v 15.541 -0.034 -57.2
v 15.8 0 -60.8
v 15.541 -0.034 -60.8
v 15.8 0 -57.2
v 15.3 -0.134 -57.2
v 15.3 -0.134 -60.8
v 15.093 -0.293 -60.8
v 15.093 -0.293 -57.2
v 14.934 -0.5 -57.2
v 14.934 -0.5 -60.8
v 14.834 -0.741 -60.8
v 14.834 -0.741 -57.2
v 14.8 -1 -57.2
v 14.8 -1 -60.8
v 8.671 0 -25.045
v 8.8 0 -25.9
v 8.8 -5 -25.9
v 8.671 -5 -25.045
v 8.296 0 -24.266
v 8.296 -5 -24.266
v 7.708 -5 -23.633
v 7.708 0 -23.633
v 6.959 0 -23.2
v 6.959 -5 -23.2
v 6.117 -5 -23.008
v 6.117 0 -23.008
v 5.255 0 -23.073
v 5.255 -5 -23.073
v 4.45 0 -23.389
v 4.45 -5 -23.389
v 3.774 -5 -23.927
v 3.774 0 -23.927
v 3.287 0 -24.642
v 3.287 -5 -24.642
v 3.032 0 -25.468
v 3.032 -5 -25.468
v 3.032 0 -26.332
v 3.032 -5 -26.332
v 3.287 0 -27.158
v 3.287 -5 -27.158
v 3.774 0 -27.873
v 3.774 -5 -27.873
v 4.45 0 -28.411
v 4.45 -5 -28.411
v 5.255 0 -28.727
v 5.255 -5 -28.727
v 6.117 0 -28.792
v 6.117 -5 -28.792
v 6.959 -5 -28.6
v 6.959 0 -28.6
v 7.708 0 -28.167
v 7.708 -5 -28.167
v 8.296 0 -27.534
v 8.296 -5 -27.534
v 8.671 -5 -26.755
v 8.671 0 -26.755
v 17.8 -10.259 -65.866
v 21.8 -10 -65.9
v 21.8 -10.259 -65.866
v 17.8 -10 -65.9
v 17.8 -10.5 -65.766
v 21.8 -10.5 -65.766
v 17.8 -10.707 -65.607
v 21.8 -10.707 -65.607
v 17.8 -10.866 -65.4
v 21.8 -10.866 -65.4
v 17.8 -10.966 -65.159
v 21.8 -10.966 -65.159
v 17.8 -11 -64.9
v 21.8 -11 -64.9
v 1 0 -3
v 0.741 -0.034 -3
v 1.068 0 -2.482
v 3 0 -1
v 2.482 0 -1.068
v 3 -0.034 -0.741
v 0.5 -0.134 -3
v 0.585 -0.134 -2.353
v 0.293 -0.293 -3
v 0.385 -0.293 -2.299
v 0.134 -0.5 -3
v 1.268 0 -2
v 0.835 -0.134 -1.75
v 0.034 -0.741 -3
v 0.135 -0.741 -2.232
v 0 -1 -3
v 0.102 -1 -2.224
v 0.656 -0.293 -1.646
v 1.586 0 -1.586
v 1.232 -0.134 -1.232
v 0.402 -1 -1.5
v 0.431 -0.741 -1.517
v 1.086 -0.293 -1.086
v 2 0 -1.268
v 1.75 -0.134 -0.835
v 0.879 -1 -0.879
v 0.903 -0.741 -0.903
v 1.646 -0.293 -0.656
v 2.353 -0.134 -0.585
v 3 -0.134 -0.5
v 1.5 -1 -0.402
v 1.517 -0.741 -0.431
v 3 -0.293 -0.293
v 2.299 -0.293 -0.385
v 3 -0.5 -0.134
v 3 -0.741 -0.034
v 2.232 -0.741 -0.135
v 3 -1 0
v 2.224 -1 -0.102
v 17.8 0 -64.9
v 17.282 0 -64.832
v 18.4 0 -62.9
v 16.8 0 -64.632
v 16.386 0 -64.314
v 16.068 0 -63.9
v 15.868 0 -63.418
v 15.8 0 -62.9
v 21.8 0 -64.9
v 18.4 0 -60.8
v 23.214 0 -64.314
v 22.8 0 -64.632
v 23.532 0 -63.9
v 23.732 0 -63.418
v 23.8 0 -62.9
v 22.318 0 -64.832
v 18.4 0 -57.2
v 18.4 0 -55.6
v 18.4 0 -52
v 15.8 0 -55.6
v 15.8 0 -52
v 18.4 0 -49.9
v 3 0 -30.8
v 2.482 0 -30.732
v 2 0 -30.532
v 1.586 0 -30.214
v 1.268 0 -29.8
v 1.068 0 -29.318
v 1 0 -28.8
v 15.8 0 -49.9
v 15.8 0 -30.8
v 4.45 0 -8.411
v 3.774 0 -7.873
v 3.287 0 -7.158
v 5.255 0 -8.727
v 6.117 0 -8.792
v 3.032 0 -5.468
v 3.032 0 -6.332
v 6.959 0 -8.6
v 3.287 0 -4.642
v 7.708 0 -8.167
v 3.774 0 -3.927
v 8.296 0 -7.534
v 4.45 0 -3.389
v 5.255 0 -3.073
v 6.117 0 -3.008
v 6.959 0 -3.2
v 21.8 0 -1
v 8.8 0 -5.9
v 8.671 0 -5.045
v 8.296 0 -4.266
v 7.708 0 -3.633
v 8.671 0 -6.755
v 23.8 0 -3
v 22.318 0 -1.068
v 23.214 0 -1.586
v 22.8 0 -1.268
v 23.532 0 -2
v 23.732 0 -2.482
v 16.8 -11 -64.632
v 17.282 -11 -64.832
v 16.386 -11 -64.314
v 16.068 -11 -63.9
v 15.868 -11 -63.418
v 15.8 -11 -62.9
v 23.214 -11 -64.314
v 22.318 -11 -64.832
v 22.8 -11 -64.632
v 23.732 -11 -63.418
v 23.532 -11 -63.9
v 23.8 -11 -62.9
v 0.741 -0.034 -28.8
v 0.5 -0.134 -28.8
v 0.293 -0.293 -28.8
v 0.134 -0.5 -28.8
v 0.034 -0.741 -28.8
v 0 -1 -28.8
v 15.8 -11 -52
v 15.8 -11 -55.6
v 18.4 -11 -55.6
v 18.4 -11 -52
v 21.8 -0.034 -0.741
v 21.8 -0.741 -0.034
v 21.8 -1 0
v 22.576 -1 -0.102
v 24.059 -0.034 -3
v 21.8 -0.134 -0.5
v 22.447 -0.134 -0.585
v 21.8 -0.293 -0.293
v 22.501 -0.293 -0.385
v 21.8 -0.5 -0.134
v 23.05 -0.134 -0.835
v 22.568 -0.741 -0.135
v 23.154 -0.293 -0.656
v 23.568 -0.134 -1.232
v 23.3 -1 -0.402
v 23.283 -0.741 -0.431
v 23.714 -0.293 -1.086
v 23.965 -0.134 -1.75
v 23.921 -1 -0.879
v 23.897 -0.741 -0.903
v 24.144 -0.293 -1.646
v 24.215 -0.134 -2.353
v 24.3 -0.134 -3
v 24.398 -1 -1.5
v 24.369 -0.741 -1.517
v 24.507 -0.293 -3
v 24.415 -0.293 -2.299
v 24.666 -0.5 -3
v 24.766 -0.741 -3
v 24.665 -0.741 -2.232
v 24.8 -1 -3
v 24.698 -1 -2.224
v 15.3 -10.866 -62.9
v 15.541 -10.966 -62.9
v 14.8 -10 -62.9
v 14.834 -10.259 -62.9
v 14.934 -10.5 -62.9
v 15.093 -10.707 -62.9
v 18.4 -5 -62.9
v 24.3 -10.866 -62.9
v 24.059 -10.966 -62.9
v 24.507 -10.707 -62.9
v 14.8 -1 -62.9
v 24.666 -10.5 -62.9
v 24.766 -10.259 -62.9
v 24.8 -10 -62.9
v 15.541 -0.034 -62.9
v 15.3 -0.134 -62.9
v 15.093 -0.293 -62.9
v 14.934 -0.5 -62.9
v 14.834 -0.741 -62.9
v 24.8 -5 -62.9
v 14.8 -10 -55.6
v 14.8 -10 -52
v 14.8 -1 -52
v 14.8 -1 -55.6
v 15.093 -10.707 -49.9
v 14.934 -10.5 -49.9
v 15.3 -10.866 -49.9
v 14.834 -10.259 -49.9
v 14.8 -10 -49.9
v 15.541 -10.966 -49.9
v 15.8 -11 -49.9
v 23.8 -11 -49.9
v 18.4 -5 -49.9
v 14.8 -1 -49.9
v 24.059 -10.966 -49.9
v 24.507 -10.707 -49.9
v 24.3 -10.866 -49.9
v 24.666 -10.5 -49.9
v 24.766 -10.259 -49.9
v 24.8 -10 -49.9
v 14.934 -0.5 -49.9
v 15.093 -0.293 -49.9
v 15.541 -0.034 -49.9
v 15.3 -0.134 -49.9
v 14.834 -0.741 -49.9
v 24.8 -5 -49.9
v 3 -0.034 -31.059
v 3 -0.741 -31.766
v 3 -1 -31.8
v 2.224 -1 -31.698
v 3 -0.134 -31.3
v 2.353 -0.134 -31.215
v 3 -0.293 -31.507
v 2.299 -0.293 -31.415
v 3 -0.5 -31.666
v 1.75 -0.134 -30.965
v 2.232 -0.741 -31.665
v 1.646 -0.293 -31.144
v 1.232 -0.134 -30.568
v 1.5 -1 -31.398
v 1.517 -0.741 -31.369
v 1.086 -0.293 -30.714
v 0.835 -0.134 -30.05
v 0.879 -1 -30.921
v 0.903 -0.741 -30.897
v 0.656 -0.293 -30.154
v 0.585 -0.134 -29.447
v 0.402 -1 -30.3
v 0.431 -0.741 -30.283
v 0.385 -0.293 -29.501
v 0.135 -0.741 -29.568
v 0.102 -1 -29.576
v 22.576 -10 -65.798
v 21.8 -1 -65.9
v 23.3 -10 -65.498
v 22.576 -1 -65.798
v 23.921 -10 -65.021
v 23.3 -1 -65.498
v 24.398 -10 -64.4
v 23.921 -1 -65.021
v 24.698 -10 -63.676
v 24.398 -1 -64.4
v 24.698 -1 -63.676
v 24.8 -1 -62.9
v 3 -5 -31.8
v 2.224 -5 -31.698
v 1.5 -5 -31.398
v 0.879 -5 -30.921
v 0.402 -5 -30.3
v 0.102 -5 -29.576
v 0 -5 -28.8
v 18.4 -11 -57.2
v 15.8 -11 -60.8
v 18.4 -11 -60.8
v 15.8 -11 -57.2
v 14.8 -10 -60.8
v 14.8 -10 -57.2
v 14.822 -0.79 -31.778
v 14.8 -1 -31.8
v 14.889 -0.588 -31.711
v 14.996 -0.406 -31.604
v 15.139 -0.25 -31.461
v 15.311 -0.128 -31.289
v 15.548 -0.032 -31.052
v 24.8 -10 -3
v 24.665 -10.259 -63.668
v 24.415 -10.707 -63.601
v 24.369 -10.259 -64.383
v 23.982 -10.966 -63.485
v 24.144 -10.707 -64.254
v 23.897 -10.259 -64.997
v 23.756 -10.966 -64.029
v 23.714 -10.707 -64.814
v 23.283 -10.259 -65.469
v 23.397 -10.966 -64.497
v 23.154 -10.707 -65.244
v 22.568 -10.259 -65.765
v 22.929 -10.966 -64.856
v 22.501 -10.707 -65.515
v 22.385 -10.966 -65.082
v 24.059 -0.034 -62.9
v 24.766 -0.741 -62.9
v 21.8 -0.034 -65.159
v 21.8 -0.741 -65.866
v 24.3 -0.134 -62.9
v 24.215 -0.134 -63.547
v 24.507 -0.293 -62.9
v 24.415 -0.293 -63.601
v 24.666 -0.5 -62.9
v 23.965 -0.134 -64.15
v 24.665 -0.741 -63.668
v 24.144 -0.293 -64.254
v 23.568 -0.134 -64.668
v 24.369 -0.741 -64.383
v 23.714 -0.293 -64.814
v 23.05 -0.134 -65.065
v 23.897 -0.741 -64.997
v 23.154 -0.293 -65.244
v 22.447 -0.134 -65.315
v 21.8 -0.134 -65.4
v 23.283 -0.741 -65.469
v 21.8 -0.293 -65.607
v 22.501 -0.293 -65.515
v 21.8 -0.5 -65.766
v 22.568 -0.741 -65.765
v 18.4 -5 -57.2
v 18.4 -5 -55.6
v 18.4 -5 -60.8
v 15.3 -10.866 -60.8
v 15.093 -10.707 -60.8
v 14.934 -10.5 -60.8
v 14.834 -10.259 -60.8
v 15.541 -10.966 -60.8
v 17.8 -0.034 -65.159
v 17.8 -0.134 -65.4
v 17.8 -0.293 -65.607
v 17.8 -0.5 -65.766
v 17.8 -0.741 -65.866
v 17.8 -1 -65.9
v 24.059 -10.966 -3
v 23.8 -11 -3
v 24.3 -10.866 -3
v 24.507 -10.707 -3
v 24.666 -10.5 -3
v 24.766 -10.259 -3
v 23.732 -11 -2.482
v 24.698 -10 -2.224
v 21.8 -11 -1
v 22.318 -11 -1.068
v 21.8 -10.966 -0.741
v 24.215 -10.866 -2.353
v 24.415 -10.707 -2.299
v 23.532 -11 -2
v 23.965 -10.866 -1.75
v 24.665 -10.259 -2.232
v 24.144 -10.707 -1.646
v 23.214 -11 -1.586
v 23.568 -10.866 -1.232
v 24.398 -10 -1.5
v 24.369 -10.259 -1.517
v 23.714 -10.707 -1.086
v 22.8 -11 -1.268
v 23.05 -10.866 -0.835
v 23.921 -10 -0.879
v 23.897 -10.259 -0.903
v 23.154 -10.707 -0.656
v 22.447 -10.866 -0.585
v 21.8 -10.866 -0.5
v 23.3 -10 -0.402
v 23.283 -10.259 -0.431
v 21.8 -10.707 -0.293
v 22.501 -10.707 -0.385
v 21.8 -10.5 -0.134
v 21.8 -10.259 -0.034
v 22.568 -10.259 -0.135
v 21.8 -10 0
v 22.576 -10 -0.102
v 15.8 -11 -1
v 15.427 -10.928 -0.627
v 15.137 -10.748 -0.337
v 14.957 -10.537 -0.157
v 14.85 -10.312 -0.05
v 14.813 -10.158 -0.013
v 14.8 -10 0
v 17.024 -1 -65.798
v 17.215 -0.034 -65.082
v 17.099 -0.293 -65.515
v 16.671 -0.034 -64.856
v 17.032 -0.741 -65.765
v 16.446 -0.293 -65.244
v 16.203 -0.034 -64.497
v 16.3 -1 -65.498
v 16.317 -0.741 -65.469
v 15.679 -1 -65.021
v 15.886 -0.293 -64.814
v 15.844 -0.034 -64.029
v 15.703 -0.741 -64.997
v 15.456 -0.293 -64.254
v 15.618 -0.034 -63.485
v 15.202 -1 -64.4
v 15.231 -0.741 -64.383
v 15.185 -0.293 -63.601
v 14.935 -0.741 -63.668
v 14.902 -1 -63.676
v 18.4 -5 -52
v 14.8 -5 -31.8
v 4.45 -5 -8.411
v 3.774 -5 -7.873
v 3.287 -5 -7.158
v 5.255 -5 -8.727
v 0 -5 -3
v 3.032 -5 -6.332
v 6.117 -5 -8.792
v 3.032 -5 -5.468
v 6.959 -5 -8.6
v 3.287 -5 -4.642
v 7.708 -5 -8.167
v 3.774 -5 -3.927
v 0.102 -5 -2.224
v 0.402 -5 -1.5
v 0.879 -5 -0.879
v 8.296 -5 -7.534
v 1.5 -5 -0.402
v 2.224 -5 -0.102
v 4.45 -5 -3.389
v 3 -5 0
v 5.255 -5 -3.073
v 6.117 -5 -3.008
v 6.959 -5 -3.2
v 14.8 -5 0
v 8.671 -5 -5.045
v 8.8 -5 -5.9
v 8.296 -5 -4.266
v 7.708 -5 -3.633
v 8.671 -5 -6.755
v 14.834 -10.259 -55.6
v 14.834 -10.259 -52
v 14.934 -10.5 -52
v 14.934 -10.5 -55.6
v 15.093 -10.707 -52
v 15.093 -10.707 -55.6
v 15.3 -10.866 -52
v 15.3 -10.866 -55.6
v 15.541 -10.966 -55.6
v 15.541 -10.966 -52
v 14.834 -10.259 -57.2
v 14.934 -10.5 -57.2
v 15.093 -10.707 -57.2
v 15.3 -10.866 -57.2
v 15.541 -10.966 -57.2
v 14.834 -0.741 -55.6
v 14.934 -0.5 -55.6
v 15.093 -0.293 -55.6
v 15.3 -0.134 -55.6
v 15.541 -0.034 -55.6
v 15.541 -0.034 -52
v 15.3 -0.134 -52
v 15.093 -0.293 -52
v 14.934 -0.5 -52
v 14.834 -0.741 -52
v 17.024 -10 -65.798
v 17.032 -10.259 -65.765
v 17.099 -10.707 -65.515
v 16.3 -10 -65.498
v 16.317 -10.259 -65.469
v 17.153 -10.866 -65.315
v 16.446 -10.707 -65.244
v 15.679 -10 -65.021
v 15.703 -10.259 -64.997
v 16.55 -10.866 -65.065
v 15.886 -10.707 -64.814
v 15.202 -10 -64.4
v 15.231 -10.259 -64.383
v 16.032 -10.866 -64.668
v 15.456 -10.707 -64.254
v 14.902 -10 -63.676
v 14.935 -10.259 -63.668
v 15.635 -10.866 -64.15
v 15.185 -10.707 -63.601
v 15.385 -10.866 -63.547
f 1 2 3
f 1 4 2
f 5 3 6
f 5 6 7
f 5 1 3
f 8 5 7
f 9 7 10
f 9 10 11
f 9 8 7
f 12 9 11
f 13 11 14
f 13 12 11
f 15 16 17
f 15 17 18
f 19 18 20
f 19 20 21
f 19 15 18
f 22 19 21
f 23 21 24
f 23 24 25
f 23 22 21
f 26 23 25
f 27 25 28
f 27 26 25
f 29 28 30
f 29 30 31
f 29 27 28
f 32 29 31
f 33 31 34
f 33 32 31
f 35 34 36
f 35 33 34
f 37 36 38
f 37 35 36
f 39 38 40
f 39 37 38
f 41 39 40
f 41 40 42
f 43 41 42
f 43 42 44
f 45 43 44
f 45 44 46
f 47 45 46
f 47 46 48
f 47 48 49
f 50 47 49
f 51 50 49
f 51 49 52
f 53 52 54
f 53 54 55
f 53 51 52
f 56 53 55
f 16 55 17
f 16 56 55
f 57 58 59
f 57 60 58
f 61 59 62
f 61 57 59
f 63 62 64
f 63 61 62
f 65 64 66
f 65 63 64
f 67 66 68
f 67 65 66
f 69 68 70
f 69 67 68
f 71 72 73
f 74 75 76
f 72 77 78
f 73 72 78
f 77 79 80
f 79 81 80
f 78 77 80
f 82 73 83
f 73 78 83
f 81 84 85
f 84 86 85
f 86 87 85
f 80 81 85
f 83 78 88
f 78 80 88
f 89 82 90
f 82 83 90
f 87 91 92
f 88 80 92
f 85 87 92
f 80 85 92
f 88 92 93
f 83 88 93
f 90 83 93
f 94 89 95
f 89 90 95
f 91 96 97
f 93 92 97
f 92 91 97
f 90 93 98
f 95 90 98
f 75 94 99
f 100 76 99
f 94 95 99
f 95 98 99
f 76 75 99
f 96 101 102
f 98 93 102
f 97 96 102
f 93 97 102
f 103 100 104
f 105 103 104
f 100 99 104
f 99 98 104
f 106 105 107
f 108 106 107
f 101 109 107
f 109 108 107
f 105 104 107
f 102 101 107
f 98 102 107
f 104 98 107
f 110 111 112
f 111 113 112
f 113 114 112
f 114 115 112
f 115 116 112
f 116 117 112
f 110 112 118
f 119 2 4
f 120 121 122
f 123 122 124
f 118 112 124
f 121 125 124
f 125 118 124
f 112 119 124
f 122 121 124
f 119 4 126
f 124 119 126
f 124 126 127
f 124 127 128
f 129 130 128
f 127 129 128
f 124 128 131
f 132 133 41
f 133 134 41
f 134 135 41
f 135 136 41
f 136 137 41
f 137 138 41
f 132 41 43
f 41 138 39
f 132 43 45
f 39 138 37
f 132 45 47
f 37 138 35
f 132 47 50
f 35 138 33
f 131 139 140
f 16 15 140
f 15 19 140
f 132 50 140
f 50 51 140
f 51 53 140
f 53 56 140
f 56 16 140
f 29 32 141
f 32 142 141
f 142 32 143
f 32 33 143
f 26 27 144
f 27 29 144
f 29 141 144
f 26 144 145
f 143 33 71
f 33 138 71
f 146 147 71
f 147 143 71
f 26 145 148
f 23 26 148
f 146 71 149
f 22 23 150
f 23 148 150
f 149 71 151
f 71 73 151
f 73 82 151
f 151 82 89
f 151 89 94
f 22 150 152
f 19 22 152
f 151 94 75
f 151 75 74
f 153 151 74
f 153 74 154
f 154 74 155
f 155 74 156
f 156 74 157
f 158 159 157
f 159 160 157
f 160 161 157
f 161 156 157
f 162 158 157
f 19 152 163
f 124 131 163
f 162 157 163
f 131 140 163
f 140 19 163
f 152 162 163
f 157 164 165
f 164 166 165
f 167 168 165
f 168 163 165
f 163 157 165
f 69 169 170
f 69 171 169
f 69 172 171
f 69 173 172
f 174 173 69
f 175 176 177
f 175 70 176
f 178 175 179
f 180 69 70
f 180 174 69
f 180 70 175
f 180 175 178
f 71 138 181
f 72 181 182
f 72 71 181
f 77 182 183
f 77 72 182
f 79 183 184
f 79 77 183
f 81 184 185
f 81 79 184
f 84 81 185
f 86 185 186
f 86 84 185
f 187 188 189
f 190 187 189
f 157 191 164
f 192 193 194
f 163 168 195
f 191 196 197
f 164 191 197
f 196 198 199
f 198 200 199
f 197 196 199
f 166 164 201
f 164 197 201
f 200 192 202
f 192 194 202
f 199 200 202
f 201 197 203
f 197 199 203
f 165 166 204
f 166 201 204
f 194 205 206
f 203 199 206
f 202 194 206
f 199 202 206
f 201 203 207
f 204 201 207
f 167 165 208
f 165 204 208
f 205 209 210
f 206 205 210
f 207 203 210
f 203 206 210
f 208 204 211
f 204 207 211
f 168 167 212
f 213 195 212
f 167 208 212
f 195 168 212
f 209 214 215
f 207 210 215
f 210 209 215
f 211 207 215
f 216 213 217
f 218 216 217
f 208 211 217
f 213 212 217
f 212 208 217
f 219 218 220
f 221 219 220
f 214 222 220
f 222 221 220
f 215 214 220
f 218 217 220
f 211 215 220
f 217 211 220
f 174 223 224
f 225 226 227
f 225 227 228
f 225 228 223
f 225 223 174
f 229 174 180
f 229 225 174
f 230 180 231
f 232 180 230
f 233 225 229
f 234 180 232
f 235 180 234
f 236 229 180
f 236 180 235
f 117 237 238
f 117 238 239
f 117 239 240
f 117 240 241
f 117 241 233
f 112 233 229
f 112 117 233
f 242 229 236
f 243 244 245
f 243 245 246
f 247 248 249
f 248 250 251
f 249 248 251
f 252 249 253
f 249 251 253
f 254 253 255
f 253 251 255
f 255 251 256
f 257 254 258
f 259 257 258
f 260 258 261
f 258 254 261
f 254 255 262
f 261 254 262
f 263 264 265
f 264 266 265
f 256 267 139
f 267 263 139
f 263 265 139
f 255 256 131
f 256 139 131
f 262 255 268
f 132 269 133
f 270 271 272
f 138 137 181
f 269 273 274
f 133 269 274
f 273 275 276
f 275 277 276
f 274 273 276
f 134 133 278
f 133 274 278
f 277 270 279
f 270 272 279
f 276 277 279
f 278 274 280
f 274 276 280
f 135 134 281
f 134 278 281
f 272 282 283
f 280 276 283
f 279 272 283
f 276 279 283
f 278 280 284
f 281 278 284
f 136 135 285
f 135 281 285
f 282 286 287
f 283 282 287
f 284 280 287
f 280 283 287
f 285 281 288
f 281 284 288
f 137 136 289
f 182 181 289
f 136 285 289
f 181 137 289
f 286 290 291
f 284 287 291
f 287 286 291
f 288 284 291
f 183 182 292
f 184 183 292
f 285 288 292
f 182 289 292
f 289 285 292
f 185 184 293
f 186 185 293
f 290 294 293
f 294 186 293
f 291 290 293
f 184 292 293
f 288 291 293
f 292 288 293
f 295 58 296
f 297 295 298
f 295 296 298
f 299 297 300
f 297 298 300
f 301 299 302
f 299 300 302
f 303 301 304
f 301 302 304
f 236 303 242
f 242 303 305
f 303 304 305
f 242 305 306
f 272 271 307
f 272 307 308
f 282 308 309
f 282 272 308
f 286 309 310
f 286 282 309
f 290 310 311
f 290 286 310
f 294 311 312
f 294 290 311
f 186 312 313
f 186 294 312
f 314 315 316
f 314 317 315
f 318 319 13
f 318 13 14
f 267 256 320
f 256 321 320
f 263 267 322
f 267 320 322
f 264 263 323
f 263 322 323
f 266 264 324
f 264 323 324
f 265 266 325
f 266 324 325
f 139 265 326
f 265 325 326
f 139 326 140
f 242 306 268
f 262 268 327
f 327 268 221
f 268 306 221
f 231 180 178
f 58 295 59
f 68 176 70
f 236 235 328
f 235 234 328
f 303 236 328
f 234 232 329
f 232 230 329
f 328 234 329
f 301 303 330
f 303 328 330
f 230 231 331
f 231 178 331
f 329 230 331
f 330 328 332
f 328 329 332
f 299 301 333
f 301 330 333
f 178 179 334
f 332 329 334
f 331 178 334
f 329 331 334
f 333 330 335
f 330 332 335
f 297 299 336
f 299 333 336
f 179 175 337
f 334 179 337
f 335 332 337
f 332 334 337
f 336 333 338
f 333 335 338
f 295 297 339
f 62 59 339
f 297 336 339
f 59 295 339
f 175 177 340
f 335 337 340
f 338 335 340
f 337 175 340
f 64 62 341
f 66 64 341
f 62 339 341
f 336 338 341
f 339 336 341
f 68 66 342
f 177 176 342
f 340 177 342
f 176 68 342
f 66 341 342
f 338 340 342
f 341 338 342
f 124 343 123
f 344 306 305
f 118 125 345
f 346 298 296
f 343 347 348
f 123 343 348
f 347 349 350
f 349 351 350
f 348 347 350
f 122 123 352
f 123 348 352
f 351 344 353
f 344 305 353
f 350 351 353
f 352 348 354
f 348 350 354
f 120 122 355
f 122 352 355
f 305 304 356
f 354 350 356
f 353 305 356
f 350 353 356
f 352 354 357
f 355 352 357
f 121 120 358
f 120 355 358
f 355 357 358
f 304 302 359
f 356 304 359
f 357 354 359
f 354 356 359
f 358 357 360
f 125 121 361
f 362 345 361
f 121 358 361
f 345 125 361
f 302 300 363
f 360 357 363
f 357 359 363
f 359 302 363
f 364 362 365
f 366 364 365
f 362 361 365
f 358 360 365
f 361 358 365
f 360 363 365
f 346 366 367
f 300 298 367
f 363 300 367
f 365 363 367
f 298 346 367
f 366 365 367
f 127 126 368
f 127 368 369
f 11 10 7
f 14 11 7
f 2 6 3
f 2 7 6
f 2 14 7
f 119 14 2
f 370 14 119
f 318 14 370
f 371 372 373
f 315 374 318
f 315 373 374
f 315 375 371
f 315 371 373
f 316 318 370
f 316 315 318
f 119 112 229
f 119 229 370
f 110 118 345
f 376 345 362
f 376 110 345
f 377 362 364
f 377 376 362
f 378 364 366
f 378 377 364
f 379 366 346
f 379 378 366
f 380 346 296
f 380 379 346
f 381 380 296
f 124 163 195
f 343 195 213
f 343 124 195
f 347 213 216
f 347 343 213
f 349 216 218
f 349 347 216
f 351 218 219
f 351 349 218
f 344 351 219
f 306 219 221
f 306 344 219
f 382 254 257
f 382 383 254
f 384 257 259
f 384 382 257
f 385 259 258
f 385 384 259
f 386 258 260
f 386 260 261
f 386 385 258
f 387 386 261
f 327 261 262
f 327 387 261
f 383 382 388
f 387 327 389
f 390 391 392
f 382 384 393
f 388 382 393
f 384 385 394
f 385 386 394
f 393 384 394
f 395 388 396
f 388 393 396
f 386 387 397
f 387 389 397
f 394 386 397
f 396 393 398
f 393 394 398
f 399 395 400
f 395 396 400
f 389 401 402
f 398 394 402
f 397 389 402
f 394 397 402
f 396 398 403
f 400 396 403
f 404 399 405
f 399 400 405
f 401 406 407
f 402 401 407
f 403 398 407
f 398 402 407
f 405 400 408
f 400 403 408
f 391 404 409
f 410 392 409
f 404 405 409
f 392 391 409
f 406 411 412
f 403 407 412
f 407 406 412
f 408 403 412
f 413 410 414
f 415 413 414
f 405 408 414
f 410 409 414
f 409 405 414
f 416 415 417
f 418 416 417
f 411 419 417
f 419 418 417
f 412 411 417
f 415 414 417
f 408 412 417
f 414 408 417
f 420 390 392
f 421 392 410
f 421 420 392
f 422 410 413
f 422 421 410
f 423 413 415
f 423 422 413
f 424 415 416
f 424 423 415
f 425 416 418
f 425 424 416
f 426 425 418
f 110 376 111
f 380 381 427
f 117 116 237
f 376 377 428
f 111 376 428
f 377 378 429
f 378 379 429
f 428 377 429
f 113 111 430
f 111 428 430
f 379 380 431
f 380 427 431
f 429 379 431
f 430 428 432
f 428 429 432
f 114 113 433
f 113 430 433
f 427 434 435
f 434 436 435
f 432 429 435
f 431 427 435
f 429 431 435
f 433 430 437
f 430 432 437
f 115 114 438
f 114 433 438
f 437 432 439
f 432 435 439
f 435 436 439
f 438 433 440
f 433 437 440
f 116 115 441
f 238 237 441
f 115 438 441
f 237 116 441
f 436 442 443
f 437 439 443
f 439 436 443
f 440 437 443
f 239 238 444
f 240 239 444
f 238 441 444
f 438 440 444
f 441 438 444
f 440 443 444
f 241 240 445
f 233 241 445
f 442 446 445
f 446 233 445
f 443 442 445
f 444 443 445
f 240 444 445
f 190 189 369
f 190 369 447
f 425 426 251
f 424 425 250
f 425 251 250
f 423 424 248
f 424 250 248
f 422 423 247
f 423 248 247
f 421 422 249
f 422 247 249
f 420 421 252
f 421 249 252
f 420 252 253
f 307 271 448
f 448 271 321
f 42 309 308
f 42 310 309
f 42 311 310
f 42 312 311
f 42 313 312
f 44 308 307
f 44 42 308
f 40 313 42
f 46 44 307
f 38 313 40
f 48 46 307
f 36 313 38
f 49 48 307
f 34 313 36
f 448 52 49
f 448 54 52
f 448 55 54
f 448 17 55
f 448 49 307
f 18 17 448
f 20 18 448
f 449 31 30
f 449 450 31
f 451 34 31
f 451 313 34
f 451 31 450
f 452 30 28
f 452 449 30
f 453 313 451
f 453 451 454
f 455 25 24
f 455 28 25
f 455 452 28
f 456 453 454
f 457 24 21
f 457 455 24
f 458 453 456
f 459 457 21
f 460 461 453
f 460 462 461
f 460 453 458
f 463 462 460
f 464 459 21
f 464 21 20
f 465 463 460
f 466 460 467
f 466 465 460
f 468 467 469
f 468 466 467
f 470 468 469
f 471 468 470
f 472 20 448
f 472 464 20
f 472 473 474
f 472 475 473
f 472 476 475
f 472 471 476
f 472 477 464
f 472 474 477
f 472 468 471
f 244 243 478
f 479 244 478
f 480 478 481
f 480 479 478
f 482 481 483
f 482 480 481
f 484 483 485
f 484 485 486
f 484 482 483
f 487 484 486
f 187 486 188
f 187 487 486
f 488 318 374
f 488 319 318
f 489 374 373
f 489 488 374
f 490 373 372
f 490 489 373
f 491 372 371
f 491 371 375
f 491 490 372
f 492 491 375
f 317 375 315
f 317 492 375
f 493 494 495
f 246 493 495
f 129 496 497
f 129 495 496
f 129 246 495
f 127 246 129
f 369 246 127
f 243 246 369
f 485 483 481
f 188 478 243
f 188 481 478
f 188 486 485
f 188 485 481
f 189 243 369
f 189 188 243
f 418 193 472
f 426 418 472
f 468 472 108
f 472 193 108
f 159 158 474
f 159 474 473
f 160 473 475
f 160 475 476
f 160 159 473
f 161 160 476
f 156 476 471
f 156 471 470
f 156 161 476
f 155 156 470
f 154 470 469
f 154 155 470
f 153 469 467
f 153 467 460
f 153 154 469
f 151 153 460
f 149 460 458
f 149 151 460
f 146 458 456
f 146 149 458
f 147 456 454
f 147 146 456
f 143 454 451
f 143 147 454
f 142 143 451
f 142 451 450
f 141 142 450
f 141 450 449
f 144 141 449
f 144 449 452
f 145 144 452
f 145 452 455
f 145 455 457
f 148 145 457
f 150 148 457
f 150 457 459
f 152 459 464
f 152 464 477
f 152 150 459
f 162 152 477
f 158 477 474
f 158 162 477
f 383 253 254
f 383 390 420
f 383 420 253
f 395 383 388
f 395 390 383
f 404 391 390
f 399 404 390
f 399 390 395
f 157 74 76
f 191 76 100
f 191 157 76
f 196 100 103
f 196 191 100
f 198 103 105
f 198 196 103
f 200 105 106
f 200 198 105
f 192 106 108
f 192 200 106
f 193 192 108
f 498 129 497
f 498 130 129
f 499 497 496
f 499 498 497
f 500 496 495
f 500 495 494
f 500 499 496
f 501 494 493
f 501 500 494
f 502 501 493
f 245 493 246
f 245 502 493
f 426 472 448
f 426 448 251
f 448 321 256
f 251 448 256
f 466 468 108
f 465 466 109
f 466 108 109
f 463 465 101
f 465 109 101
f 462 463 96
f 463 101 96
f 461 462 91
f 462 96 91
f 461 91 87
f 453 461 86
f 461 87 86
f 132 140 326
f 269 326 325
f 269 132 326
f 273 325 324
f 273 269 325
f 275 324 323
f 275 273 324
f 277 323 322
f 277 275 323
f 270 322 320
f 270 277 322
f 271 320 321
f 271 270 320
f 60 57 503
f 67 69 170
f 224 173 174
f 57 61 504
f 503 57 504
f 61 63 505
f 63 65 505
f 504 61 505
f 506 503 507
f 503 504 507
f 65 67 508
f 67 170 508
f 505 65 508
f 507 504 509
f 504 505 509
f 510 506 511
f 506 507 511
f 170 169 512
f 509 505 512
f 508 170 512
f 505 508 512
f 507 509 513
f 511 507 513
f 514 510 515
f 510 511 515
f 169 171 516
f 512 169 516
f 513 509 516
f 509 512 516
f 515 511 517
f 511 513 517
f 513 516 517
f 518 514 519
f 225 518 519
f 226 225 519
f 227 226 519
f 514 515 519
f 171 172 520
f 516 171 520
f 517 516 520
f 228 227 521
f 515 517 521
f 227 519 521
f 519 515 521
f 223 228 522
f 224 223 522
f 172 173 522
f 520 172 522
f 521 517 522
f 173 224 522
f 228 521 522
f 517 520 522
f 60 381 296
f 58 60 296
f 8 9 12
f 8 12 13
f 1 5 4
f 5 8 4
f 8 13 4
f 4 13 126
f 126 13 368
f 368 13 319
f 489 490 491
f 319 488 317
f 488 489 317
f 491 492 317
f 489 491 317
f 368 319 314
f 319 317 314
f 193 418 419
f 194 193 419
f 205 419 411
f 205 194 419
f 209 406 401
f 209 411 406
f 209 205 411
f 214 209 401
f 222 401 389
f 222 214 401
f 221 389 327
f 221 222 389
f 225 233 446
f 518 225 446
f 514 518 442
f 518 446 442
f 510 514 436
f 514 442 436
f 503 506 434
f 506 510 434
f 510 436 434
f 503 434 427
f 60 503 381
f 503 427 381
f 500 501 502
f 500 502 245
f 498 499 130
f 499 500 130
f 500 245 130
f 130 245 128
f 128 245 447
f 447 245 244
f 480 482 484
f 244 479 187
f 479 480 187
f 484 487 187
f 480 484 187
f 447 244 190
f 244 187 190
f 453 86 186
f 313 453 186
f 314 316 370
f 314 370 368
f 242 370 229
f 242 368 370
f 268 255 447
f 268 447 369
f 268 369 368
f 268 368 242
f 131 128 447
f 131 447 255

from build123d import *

# Parameters (mm, degrees)
F0_R        = 2.9
F0_W        = 10
F0_H        = 34.1
F1_DEPTH    = 5
F2_W        = 10
F2_H        = 3
F3_DEPTH    = 6
F4_W        = 3.6
F4_H        = 3.6
F5_DEPTH    = 6
F6_W        = 3.6
F6_H        = 2.1
F6_H_2      = 1.6
F7_DEPTH    = 5.001
F8_T1_DEPTH = 20
F8_T3_DEPTH = 26
F9_R        = 1


# Not quite as in the source:
# - a fillet or chamfer that OpenCascade refuses, or shapes differently, is made with other operations: its cross-section is extruded or revolved along the edge and cut away or added


with BuildPart() as f1:
    # F0 (on Front) → F1 (new body)
    with BuildSketch(Plane.XZ):
        Polygon((24.8, 0), (0, 0), (0, -31.8), (14.8, -31.8), (24.8, -31.8), align=None)
        with Locations((5.9, -25.9)):
            Circle(F0_R, mode=Mode.SUBTRACT)
        with Locations((5.9, -5.9)):
            Circle(F0_R, mode=Mode.SUBTRACT)
        with Locations((19.8, -48.85)):
            Rectangle(F0_W, F0_H)
    extrude(amount=F1_DEPTH)

    # F2 (on face) → F3 (join)
    with BuildSketch(Plane.XZ.offset(5)):
        Polygon((14.8, -49.9), (24.8, -49.9), (24.8, 0), (14.8, 0), (14.8, -31.8), align=None)
        with Locations((19.8, -64.4)):
            Rectangle(F2_W, F2_H)
    extrude(amount=F3_DEPTH)

    # F4 (on face) → F5 (join, through all)
    with BuildSketch(Plane.XZ.offset(5)):
        with Locations((16.6, -53.8)):
            Rectangle(F4_W, F4_H)
        with Locations((16.6, -59)):
            Rectangle(F4_W, F4_H)
    extrude(amount=F5_DEPTH)

    # F6 (on face) → F7 (cut, through all)
    with BuildSketch(Plane.XZ.offset(5)):
        with Locations((16.6, -50.95)):
            Rectangle(F6_W, F6_H)
        with Locations((16.6, -56.4)):
            Rectangle(F6_W, F6_H_2)
        with Locations((16.6, -61.85)):
            Rectangle(F6_W, F6_H)
    extrude(amount=-F7_DEPTH, mode=Mode.SUBTRACT)

    # F8: fillet of radius 3 on 5 edges, made by hand

    # F8_s2 → F8_t1 (cut)
    with BuildSketch(Plane.XZ.offset(-7.5)):
        with BuildLine():
            ThreePointArc((3, -31.8), (0.8786796564, -30.9213203436), (0, -28.8))
            Line((0, -28.8), (0, -31.8))
            Line((0, -31.8), (3, -31.8))
        make_face()
        with BuildLine():
            ThreePointArc((3, 0), (0.8786796564, -0.8786796564), (0, -3))
            Line((0, -3), (0, 0))
            Line((0, 0), (3, 0))
        make_face()
    extrude(amount=F8_T1_DEPTH, mode=Mode.SUBTRACT)

    # F8_s4 → F8_t3 (cut)
    with BuildSketch(Plane.XZ.offset(-7.5)):
        with BuildLine():
            ThreePointArc((21.8, 0), (23.9213203436, -0.8786796564), (24.8, -3))
            Line((24.8, -3), (24.8, 0))
            Line((24.8, 0), (21.8, 0))
        make_face()
        with BuildLine():
            ThreePointArc((21.8, -65.9), (23.9213203436, -65.0213203436), (24.8, -62.9))
            Line((24.8, -62.9), (24.8, -65.9))
            Line((24.8, -65.9), (21.8, -65.9))
        make_face()
        with BuildLine():
            ThreePointArc((14.8, -62.9), (15.6786796564, -65.0213203436), (17.8, -65.9))
            Line((17.8, -65.9), (14.8, -65.9))
            Line((14.8, -65.9), (14.8, -62.9))
        make_face()
    extrude(amount=F8_T3_DEPTH, mode=Mode.SUBTRACT)

    # F9
    f9_edges = [f1.edges().sort_by_distance(p)[0] for p in [
        (14.8, 0, -53.8),
        (14.8, 0, -59),
        (14.8, 0, -40.85),
        (24.8, -11, -26.45),
        (15.67868, 0, -65.02132),
        (14.8, -11, -24.95),
        (23.92132, -11, -65.02132),
        (12.4, 0, 0),
        (18.3, -11, 0),
        (23.92132, 0, -0.87868),
        (23.92132, -11, -0.87868),
        (8.9, 0, -31.8),
        (0.87868, 0, -30.92132),
        (0, 0, -15.9),
        (0.87868, 0, -0.87868),
        (24.8, 0, -32.95),
        (23.92132, 0, -65.02132),
        (19.8, 0, -65.9),
        (15.67868, -11, -65.02132),
        (14.8, -11, -59),
        (14.8, -11, -53.8),
        (19.8, -11, -65.9),
    ]]
    fillet(f9_edges, radius=F9_R)


solid = f1.part
